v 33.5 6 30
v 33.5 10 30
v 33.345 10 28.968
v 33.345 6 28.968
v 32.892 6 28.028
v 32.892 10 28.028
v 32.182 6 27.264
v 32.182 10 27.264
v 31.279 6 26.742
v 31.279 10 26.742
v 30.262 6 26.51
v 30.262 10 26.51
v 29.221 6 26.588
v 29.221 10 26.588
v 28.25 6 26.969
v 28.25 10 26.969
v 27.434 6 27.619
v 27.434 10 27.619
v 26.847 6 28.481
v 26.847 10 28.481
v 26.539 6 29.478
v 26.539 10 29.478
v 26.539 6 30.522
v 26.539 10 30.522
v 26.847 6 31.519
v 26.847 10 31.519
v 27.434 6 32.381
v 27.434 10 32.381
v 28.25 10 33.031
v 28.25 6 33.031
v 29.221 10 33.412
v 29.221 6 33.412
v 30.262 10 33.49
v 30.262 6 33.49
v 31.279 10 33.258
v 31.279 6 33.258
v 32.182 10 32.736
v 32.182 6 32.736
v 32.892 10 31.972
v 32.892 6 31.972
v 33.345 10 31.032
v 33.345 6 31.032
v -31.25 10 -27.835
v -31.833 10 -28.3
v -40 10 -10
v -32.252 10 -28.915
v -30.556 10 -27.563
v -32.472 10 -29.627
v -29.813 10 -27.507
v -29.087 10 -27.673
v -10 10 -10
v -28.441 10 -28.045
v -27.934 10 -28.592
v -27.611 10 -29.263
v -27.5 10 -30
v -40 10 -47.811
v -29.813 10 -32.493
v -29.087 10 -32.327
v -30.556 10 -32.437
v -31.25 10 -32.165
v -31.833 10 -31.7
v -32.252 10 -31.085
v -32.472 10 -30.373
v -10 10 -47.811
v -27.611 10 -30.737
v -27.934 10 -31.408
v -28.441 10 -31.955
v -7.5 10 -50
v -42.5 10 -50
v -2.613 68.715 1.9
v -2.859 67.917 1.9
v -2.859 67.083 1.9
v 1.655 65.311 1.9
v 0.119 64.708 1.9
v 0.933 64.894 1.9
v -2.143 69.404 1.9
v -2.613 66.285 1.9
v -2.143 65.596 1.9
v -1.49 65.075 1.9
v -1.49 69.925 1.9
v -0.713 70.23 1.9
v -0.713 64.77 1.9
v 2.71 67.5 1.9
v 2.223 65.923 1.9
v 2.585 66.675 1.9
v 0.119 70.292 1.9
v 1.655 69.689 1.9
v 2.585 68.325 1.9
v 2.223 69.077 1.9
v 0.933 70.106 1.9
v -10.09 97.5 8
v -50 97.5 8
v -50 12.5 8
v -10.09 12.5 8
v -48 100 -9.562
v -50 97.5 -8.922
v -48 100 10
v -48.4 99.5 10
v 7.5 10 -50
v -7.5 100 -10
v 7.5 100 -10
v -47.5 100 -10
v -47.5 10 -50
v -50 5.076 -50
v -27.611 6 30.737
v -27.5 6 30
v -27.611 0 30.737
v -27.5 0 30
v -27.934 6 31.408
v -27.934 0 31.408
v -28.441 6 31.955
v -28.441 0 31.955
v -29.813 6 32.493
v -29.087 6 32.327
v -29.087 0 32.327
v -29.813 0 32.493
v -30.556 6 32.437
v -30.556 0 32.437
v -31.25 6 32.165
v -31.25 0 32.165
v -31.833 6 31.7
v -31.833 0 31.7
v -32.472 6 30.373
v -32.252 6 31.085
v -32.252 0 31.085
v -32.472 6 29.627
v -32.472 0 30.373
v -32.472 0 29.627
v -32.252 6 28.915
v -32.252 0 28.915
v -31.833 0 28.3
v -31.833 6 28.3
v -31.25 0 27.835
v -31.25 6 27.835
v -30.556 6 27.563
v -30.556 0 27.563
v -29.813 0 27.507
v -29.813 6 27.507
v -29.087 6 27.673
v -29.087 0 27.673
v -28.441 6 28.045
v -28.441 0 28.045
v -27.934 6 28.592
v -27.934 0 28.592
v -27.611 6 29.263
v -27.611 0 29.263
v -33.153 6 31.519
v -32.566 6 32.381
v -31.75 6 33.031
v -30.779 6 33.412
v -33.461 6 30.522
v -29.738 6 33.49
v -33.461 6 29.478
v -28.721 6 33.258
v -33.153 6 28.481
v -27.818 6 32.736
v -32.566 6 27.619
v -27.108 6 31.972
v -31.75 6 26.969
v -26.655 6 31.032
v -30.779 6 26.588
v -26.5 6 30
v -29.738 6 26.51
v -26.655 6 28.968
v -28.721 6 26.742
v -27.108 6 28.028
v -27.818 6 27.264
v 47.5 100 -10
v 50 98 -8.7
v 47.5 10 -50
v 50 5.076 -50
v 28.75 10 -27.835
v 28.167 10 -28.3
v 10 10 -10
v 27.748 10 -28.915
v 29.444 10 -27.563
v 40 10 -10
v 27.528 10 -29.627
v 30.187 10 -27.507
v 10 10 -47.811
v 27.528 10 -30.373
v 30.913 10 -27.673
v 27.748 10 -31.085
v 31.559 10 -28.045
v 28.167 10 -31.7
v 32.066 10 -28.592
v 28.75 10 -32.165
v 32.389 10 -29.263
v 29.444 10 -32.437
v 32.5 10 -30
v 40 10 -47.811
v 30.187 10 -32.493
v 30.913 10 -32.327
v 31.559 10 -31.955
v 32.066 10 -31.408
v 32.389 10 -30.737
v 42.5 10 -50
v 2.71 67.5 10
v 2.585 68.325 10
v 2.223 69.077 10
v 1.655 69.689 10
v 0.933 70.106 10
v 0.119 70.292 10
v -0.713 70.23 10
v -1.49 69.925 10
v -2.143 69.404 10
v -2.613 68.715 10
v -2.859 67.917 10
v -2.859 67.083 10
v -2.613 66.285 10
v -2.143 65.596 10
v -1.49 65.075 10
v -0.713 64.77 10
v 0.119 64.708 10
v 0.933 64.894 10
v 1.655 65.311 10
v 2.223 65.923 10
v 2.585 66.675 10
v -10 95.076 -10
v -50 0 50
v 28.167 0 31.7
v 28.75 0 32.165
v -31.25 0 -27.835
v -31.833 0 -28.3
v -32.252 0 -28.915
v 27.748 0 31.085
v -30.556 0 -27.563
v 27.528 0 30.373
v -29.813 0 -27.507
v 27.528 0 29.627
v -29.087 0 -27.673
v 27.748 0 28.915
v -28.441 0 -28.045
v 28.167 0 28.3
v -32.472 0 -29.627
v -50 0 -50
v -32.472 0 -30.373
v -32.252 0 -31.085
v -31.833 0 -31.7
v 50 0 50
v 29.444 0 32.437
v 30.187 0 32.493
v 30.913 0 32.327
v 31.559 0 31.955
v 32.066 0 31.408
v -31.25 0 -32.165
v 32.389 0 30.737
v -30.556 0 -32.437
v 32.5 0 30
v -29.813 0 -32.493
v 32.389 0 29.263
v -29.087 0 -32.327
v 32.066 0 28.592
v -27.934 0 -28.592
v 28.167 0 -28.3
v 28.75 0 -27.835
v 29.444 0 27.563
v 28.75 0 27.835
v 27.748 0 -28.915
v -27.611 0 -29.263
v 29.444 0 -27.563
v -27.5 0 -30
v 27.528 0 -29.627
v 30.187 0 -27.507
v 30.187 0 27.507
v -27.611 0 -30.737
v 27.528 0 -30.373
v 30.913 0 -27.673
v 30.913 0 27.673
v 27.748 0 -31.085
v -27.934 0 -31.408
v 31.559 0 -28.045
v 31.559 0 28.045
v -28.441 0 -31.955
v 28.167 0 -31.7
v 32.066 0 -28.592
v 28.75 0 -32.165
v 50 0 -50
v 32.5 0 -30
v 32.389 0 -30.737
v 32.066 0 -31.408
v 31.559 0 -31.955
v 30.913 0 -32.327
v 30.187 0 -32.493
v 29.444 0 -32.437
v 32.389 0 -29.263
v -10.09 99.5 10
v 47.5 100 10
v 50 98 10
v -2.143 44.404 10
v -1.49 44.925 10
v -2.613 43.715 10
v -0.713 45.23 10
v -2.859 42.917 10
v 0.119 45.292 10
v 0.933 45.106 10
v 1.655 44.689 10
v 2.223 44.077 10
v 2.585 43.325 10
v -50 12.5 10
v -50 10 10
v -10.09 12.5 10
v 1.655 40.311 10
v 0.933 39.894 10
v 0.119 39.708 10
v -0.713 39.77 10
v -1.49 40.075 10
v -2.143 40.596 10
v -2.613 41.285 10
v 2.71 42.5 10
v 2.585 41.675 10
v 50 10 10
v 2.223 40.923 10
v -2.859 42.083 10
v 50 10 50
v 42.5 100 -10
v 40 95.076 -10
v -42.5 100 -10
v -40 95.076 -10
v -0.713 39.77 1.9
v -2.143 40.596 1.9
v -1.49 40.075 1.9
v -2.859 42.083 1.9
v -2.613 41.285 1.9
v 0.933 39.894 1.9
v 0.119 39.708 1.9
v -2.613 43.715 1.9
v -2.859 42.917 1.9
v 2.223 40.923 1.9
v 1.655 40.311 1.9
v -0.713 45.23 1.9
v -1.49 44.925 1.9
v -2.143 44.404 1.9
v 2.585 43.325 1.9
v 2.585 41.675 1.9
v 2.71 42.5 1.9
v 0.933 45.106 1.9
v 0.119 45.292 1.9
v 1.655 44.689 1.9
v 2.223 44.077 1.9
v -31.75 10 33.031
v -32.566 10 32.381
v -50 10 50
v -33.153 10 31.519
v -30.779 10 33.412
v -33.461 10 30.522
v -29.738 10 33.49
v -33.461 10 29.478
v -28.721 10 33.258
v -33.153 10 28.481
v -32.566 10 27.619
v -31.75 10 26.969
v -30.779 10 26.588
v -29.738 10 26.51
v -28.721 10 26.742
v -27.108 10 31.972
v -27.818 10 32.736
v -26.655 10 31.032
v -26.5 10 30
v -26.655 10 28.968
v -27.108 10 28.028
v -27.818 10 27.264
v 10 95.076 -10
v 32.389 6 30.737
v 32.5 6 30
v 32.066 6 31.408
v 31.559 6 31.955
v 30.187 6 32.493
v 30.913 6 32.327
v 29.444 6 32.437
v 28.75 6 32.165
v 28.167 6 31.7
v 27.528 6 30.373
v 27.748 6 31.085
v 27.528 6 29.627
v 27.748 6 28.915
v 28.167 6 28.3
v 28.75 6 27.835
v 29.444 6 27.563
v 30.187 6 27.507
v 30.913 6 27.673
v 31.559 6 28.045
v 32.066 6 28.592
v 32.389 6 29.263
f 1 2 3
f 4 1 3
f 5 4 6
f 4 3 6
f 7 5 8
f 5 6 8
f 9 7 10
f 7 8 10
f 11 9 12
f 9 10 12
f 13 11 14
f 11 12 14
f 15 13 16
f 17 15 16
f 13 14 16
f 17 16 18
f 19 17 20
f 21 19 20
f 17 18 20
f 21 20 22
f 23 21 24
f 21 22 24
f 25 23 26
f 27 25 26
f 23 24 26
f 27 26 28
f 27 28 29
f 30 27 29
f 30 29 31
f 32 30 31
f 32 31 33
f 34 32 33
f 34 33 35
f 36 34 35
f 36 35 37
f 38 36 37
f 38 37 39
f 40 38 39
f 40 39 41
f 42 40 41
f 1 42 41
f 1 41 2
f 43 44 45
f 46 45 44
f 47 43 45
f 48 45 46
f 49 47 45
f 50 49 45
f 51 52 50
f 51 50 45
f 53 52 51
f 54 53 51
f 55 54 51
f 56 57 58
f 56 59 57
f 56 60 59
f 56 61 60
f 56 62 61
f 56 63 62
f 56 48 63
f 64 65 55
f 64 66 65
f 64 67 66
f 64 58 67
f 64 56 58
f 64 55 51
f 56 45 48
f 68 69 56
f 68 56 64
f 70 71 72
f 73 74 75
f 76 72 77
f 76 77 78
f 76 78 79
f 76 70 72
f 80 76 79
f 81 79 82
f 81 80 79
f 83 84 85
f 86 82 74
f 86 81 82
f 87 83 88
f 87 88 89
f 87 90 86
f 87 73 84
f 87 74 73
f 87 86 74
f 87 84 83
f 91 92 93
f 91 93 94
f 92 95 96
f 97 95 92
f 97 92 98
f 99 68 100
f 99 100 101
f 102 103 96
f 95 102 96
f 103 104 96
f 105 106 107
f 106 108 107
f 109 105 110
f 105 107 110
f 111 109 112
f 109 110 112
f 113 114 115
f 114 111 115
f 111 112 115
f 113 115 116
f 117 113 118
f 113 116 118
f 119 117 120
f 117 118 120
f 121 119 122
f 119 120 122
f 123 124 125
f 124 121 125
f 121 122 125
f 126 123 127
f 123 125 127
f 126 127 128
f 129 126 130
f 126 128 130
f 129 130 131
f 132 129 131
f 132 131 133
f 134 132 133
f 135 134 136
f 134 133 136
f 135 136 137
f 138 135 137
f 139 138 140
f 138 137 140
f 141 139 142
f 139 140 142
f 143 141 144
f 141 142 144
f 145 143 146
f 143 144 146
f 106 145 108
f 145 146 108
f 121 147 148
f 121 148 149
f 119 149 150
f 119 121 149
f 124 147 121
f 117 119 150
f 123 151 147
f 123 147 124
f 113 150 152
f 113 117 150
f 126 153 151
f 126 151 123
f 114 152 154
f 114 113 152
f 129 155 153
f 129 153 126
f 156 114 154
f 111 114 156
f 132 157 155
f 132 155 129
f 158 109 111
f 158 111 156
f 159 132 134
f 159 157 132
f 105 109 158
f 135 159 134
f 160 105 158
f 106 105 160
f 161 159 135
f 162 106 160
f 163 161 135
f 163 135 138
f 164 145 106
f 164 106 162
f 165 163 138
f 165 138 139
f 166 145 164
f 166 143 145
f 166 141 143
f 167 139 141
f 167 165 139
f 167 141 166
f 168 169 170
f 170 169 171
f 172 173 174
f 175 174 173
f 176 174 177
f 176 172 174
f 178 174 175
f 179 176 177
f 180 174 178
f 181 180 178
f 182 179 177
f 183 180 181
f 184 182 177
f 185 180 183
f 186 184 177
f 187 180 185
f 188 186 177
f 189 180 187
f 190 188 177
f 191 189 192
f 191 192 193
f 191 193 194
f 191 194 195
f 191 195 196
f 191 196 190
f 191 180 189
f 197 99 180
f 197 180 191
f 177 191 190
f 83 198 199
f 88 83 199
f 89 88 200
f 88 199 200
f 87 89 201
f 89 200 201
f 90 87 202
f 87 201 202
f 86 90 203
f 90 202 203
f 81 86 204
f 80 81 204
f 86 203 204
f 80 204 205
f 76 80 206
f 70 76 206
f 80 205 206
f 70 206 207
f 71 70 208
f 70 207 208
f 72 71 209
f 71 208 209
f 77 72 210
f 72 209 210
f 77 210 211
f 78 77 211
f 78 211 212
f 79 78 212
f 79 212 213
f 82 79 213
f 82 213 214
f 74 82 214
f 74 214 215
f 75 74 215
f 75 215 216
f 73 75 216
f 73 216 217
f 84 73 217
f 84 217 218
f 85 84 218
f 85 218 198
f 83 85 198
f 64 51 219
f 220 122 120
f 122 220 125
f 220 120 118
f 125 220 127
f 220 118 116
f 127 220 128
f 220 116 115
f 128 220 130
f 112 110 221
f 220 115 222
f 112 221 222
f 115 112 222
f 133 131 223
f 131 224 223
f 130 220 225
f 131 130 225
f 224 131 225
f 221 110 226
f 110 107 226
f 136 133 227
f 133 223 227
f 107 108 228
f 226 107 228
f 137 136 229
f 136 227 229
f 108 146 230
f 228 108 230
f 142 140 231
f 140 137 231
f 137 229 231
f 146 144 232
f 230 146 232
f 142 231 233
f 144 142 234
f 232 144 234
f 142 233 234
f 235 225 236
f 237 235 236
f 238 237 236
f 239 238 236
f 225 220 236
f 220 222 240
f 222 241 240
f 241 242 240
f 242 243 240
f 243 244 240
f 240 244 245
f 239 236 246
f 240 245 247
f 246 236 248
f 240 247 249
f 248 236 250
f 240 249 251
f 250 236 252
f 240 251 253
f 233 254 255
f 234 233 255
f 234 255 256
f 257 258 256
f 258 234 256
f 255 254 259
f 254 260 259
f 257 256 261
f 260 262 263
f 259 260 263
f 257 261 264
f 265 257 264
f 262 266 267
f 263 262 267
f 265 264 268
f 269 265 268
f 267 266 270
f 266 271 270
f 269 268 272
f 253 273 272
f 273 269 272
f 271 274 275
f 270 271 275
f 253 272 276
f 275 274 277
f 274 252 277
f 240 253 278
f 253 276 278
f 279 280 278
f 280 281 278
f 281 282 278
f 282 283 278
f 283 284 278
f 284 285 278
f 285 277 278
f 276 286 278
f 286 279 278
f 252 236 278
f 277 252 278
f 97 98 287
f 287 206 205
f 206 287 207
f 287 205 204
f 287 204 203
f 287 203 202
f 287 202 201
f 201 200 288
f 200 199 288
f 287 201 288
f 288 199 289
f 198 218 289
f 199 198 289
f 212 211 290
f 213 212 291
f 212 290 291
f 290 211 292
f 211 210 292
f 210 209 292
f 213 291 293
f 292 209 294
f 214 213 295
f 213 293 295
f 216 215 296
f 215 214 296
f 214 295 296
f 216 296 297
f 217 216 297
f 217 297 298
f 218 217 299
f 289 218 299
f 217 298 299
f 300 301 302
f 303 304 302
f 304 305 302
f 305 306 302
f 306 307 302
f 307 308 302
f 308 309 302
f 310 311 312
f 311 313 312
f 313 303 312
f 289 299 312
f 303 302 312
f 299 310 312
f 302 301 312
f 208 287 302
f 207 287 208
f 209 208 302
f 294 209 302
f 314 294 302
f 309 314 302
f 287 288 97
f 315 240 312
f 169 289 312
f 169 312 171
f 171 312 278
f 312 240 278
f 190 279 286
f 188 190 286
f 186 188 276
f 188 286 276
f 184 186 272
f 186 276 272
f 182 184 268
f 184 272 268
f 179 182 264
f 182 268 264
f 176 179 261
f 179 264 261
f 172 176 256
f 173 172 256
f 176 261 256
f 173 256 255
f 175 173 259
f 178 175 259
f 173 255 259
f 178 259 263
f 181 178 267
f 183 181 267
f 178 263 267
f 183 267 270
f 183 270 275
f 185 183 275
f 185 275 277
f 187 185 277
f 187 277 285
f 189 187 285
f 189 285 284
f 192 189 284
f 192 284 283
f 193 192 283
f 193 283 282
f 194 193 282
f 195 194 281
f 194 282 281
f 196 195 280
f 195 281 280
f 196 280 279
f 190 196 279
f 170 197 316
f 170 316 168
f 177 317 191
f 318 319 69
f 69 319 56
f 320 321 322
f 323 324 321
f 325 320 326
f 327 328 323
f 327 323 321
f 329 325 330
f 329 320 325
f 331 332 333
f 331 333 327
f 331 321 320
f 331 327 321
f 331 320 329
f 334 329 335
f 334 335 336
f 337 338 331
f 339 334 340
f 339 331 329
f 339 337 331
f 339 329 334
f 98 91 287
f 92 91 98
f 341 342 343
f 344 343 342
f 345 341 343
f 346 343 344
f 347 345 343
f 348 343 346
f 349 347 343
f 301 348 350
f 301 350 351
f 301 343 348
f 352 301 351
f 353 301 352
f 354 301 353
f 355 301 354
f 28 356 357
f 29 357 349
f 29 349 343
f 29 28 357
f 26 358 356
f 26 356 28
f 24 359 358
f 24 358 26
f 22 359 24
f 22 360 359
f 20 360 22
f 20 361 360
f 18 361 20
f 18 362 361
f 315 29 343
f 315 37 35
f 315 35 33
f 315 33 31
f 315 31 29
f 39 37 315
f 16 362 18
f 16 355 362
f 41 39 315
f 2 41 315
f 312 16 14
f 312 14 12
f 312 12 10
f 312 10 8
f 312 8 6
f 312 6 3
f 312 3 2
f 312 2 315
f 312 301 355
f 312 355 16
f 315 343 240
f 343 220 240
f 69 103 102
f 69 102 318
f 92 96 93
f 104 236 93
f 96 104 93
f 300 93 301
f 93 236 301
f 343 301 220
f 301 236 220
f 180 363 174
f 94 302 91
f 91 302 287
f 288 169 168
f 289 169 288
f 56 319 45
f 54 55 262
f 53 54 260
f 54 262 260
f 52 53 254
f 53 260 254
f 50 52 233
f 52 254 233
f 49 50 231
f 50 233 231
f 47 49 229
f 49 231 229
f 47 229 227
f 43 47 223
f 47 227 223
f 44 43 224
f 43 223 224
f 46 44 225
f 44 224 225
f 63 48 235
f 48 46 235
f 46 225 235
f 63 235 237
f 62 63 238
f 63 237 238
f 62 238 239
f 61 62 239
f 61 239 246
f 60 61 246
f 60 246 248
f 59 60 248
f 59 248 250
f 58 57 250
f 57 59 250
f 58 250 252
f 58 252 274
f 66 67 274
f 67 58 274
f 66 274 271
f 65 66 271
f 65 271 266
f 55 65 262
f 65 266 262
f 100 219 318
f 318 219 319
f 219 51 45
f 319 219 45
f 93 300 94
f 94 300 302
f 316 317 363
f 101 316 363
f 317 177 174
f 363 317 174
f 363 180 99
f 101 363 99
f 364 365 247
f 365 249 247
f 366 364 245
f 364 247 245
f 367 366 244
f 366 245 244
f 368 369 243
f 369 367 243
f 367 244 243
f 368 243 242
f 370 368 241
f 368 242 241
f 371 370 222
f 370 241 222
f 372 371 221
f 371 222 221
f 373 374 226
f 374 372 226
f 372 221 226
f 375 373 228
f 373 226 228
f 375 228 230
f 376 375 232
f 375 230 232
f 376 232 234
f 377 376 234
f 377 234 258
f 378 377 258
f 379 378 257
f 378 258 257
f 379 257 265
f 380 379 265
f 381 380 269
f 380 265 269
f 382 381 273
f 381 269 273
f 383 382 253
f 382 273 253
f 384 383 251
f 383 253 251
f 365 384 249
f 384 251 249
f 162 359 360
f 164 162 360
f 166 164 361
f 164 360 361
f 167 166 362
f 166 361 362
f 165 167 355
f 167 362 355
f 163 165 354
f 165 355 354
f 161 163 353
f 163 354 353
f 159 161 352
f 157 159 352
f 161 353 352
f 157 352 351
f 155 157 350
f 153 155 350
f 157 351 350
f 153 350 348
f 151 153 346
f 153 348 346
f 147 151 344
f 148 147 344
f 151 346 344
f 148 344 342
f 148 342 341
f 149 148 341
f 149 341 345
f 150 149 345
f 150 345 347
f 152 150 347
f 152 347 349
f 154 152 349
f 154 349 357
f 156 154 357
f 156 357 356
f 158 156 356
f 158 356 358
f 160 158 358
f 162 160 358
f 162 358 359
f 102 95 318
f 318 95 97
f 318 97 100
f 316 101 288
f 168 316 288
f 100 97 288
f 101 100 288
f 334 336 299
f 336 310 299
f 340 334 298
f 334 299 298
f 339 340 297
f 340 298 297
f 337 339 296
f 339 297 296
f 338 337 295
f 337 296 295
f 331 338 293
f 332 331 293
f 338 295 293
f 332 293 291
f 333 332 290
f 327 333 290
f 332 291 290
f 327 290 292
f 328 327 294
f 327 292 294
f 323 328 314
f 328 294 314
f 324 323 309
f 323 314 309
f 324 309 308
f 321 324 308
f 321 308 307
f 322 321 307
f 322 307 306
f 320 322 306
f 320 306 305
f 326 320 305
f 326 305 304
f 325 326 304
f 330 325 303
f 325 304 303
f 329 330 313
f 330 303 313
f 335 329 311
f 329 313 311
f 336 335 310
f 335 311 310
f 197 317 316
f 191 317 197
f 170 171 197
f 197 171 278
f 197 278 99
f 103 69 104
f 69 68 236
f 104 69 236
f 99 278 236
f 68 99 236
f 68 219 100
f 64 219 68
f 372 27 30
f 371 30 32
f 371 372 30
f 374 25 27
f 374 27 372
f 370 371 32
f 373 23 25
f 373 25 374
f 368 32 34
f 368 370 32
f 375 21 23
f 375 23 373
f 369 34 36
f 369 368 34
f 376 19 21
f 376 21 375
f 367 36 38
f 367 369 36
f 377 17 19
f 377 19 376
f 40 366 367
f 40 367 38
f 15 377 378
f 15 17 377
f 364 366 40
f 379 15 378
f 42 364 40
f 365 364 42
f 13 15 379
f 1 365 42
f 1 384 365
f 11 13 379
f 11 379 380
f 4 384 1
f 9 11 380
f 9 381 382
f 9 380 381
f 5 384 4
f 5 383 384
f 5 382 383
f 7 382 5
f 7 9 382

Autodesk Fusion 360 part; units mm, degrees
sketch "Sketch1" plane through (0, 0, 0) normal (0, 1, 0) x (1, 0, 0)
  line L0 (30, 30) -> (-30, 30)
  line L1 (-30, 30) -> (-30, -30)
  line L2 (-30, -30) -> (30, -30)
  line L3 (30, -30) -> (30, 30)
  line L4 (30, 30) -> (-30, -30) construction
  line L5 (-30, 30) -> (30, -30) construction
  circle A0 centre (-30, 30) radius 2.5
  circle A1 centre (30, 30) radius 2.5
  circle A2 centre (-30, -30) radius 2.5
  circle A3 centre (30, -30) radius 2.5
  line L6 (50, 50) -> (-50, 50)
  line L7 (-50, 50) -> (-50, -50)
  line L8 (-50, -50) -> (50, -50)
  line L9 (50, -50) -> (50, 50)
  line L10 (50, 50) -> (-50, -50) construction
  line L11 (-50, 50) -> (50, -50) construction
  line L12 (50, 10) -> (-50, 10)
  line L13 (-50, 10) -> (-50, -10)
  line L14 (-50, -10) -> (50, -10)
  line L15 (50, -10) -> (50, 10)
  line L16 (50, 10) -> (-50, -10) construction
  line L17 (-50, 10) -> (50, -10) construction
  circle A4 centre (-30, -30) radius 3.5
  circle A5 centre (30, -30) radius 3.5
  dimension "d1" = 60
  dimension "d2" = 60
  dimension "d3" = 5
  dimension "d6" = 60
  dimension "d7" = -60
  dimension "d8" = 100
  dimension "d9" = 100
  dimension "d10" = 100
  dimension "d11" = 20
  dimension "d49" = 7
  dimension "d50" = 7
extrude "Extrude1" add sketch "Sketch1" along normal blind 10 contours L0 L1 L3 A0 A1 L6 L7 L9 L12 | L0 L1 L3 A0 A1 L12 | L1 L3 L12 L14 | L1 L7 L12 L13 L14 | L3 L9 L12 L14 L15 | L1 L2 L3 L14 A4 A5 | L1 L2 L3 L7 L8 L9 L14 A4 A5 | L1 L2 A2 A4 | L1 L2 A2 A4 | L2 L3 A3 A5 | L2 L3 A3 A5
extrude "Extrude2" add sketch "Sketch1" along normal blind 90 from surface at 10 contours L1 L3 L12 L14 | L1 L7 L12 L13 L14 | L3 L9 L12 L14 L15
sketch "Sketch2" plane through (0, 0, -10) normal (0, 0, -1) x (-1, 0, 0)
  line L0 (-50, 10) -> (50, 10)
  line L1 (50, 10) -> (50, 100)
  line L2 (50, 100) -> (-50, 100)
  line L3 (-50, 100) -> (-50, 10)
  line L4 (-50, 100) -> (-40, 100)
  line L5 (-40, 100) -> (-40, 10)
  line L6 (-40, 10) -> (-50, 10)
  line L7 (-50, 10) -> (-50, 100)
  line L8 (50, 100) -> (40, 100)
  line L9 (40, 100) -> (40, 10)
  line L10 (40, 10) -> (50, 10)
  line L11 (50, 10) -> (50, 100)
  line L12 (0, 100) -> (0, 10)
  line L13 (10, 100) -> (-10, 100)
  line L14 (-10, 100) -> (-10, 10)
  line L15 (-10, 10) -> (10, 10)
  line L16 (10, 10) -> (10, 100)
  dimension "d17" = 10
  dimension "d19" = 10
  dimension "d22" = 20
  dimension "d23" = 20
extrude "Extrude3" add sketch "Sketch2" along normal up to surface (40 mm away) contours L0 L2 L3 L4 L5 L6 L7 | L0 L2 L12 L13 L14 L15 | L0 L2 L12 L13 L15 L16 | L0 L1 L2 L8 L9 L10 L11
chamfer "Chamfer1" distance 40 distance2 90 3 edges at (45, 100, -50) (0, 100, -50) (-45, 100, -50) measured on face at (-3.3333, 100, 3.3333) measured on face at (-3.3333, 100, 3.3333) measured on face at (-3.3333, 100, 3.3333)
chamfer "Chamfer2" distance 2.5 distance2 2 6 edges at (50, 55, -30) (40, 55, -30) (10, 55, -30) (-10, 55, -30) (-40, 55, -30) (-50, 55, -30) measured on face at (43.3333, 40, -36.6667) measured on face at (43.3333, 40, -36.6667) measured on face at (3.3333, 40, -36.6667) measured on face at (3.3333, 40, -36.6667) measured on face at (-43.3333, 70, -23.3333) measured on face at (-43.3333, 70, -23.3333)
chamfer "Chamfer3" distance 2.5 distance2 2 2 edges at (50, 100, 1.0943) (-50, 100, 1.0943) measured on face at (-2.5, 100, 3.3333) measured on face at (-50, 38.3585, -15.9371)
sketch "Sketch3" plane through (0, 0, 10) normal (0, 0, 1) x (1, 0, 0)
  line L0 (-48, 100) -> (-50, 97.5)
  line L1 (-50, 97.5) -> (-50, 10)
  line L2 (-50, 10) -> (50, 10)
  line L3 (50, 10) -> (50, 98)
  line L4 (50, 98) -> (47.5, 100)
  line L5 (47.5, 100) -> (-48, 100)
  line L6 (-0.25, 100) -> (0, 10)
  line L7 (-50, 10) -> (50, 10)
  line L8 (50, 10) -> (50, 100)
  line L9 (50, 100) -> (-50, 100)
  line L10 (-50, 100) -> (-50, 10)
  line L11 (50, 55) -> (-50, 55) construction
  circle A0 centre (-0.0903, 42.5) radius 2.8
  circle A1 centre (-0.0903, 67.5) radius 2.8
  line L12 (-50, 12.5) -> (-10.0903, 12.5)
  line L13 (-10.0903, 12.5) -> (-10.0903, 97.5)
  line L14 (-10.0903, 97.5) -> (-50, 97.5)
  line L15 (-50, 97.5) -> (-50, 12.5)
  dimension "d43" = 90
  dimension "d44" = 100
  dimension "d45" = 5.6
  dimension "d46" = 12.5
  dimension "d54" = 85
  dimension "d55" = 10
extrude "Extrude4" cut sketch "Sketch3" against normal blind 8.1 contours L6 A1 | L6 A1 | L6 A0 | L6 A0
extrude "Extrude5" cut sketch "Sketch1" against normal blind 4 from surface at 10 contours L1 L2 A2 A4 | L1 L2 A2 A4 | L2 L3 A3 A5 | L2 L3 A3 A5
extrude "Extrude6" cut sketch "Sketch3" against normal blind 2 contours L1 L10 L12 L13 L14 L15
chamfer "Chamfer4" distance 2 angle 45 1 edges at (-30.0451, 97.5, 10)
equation "d46 = ( 25 / 2 ) * 1 mm"
